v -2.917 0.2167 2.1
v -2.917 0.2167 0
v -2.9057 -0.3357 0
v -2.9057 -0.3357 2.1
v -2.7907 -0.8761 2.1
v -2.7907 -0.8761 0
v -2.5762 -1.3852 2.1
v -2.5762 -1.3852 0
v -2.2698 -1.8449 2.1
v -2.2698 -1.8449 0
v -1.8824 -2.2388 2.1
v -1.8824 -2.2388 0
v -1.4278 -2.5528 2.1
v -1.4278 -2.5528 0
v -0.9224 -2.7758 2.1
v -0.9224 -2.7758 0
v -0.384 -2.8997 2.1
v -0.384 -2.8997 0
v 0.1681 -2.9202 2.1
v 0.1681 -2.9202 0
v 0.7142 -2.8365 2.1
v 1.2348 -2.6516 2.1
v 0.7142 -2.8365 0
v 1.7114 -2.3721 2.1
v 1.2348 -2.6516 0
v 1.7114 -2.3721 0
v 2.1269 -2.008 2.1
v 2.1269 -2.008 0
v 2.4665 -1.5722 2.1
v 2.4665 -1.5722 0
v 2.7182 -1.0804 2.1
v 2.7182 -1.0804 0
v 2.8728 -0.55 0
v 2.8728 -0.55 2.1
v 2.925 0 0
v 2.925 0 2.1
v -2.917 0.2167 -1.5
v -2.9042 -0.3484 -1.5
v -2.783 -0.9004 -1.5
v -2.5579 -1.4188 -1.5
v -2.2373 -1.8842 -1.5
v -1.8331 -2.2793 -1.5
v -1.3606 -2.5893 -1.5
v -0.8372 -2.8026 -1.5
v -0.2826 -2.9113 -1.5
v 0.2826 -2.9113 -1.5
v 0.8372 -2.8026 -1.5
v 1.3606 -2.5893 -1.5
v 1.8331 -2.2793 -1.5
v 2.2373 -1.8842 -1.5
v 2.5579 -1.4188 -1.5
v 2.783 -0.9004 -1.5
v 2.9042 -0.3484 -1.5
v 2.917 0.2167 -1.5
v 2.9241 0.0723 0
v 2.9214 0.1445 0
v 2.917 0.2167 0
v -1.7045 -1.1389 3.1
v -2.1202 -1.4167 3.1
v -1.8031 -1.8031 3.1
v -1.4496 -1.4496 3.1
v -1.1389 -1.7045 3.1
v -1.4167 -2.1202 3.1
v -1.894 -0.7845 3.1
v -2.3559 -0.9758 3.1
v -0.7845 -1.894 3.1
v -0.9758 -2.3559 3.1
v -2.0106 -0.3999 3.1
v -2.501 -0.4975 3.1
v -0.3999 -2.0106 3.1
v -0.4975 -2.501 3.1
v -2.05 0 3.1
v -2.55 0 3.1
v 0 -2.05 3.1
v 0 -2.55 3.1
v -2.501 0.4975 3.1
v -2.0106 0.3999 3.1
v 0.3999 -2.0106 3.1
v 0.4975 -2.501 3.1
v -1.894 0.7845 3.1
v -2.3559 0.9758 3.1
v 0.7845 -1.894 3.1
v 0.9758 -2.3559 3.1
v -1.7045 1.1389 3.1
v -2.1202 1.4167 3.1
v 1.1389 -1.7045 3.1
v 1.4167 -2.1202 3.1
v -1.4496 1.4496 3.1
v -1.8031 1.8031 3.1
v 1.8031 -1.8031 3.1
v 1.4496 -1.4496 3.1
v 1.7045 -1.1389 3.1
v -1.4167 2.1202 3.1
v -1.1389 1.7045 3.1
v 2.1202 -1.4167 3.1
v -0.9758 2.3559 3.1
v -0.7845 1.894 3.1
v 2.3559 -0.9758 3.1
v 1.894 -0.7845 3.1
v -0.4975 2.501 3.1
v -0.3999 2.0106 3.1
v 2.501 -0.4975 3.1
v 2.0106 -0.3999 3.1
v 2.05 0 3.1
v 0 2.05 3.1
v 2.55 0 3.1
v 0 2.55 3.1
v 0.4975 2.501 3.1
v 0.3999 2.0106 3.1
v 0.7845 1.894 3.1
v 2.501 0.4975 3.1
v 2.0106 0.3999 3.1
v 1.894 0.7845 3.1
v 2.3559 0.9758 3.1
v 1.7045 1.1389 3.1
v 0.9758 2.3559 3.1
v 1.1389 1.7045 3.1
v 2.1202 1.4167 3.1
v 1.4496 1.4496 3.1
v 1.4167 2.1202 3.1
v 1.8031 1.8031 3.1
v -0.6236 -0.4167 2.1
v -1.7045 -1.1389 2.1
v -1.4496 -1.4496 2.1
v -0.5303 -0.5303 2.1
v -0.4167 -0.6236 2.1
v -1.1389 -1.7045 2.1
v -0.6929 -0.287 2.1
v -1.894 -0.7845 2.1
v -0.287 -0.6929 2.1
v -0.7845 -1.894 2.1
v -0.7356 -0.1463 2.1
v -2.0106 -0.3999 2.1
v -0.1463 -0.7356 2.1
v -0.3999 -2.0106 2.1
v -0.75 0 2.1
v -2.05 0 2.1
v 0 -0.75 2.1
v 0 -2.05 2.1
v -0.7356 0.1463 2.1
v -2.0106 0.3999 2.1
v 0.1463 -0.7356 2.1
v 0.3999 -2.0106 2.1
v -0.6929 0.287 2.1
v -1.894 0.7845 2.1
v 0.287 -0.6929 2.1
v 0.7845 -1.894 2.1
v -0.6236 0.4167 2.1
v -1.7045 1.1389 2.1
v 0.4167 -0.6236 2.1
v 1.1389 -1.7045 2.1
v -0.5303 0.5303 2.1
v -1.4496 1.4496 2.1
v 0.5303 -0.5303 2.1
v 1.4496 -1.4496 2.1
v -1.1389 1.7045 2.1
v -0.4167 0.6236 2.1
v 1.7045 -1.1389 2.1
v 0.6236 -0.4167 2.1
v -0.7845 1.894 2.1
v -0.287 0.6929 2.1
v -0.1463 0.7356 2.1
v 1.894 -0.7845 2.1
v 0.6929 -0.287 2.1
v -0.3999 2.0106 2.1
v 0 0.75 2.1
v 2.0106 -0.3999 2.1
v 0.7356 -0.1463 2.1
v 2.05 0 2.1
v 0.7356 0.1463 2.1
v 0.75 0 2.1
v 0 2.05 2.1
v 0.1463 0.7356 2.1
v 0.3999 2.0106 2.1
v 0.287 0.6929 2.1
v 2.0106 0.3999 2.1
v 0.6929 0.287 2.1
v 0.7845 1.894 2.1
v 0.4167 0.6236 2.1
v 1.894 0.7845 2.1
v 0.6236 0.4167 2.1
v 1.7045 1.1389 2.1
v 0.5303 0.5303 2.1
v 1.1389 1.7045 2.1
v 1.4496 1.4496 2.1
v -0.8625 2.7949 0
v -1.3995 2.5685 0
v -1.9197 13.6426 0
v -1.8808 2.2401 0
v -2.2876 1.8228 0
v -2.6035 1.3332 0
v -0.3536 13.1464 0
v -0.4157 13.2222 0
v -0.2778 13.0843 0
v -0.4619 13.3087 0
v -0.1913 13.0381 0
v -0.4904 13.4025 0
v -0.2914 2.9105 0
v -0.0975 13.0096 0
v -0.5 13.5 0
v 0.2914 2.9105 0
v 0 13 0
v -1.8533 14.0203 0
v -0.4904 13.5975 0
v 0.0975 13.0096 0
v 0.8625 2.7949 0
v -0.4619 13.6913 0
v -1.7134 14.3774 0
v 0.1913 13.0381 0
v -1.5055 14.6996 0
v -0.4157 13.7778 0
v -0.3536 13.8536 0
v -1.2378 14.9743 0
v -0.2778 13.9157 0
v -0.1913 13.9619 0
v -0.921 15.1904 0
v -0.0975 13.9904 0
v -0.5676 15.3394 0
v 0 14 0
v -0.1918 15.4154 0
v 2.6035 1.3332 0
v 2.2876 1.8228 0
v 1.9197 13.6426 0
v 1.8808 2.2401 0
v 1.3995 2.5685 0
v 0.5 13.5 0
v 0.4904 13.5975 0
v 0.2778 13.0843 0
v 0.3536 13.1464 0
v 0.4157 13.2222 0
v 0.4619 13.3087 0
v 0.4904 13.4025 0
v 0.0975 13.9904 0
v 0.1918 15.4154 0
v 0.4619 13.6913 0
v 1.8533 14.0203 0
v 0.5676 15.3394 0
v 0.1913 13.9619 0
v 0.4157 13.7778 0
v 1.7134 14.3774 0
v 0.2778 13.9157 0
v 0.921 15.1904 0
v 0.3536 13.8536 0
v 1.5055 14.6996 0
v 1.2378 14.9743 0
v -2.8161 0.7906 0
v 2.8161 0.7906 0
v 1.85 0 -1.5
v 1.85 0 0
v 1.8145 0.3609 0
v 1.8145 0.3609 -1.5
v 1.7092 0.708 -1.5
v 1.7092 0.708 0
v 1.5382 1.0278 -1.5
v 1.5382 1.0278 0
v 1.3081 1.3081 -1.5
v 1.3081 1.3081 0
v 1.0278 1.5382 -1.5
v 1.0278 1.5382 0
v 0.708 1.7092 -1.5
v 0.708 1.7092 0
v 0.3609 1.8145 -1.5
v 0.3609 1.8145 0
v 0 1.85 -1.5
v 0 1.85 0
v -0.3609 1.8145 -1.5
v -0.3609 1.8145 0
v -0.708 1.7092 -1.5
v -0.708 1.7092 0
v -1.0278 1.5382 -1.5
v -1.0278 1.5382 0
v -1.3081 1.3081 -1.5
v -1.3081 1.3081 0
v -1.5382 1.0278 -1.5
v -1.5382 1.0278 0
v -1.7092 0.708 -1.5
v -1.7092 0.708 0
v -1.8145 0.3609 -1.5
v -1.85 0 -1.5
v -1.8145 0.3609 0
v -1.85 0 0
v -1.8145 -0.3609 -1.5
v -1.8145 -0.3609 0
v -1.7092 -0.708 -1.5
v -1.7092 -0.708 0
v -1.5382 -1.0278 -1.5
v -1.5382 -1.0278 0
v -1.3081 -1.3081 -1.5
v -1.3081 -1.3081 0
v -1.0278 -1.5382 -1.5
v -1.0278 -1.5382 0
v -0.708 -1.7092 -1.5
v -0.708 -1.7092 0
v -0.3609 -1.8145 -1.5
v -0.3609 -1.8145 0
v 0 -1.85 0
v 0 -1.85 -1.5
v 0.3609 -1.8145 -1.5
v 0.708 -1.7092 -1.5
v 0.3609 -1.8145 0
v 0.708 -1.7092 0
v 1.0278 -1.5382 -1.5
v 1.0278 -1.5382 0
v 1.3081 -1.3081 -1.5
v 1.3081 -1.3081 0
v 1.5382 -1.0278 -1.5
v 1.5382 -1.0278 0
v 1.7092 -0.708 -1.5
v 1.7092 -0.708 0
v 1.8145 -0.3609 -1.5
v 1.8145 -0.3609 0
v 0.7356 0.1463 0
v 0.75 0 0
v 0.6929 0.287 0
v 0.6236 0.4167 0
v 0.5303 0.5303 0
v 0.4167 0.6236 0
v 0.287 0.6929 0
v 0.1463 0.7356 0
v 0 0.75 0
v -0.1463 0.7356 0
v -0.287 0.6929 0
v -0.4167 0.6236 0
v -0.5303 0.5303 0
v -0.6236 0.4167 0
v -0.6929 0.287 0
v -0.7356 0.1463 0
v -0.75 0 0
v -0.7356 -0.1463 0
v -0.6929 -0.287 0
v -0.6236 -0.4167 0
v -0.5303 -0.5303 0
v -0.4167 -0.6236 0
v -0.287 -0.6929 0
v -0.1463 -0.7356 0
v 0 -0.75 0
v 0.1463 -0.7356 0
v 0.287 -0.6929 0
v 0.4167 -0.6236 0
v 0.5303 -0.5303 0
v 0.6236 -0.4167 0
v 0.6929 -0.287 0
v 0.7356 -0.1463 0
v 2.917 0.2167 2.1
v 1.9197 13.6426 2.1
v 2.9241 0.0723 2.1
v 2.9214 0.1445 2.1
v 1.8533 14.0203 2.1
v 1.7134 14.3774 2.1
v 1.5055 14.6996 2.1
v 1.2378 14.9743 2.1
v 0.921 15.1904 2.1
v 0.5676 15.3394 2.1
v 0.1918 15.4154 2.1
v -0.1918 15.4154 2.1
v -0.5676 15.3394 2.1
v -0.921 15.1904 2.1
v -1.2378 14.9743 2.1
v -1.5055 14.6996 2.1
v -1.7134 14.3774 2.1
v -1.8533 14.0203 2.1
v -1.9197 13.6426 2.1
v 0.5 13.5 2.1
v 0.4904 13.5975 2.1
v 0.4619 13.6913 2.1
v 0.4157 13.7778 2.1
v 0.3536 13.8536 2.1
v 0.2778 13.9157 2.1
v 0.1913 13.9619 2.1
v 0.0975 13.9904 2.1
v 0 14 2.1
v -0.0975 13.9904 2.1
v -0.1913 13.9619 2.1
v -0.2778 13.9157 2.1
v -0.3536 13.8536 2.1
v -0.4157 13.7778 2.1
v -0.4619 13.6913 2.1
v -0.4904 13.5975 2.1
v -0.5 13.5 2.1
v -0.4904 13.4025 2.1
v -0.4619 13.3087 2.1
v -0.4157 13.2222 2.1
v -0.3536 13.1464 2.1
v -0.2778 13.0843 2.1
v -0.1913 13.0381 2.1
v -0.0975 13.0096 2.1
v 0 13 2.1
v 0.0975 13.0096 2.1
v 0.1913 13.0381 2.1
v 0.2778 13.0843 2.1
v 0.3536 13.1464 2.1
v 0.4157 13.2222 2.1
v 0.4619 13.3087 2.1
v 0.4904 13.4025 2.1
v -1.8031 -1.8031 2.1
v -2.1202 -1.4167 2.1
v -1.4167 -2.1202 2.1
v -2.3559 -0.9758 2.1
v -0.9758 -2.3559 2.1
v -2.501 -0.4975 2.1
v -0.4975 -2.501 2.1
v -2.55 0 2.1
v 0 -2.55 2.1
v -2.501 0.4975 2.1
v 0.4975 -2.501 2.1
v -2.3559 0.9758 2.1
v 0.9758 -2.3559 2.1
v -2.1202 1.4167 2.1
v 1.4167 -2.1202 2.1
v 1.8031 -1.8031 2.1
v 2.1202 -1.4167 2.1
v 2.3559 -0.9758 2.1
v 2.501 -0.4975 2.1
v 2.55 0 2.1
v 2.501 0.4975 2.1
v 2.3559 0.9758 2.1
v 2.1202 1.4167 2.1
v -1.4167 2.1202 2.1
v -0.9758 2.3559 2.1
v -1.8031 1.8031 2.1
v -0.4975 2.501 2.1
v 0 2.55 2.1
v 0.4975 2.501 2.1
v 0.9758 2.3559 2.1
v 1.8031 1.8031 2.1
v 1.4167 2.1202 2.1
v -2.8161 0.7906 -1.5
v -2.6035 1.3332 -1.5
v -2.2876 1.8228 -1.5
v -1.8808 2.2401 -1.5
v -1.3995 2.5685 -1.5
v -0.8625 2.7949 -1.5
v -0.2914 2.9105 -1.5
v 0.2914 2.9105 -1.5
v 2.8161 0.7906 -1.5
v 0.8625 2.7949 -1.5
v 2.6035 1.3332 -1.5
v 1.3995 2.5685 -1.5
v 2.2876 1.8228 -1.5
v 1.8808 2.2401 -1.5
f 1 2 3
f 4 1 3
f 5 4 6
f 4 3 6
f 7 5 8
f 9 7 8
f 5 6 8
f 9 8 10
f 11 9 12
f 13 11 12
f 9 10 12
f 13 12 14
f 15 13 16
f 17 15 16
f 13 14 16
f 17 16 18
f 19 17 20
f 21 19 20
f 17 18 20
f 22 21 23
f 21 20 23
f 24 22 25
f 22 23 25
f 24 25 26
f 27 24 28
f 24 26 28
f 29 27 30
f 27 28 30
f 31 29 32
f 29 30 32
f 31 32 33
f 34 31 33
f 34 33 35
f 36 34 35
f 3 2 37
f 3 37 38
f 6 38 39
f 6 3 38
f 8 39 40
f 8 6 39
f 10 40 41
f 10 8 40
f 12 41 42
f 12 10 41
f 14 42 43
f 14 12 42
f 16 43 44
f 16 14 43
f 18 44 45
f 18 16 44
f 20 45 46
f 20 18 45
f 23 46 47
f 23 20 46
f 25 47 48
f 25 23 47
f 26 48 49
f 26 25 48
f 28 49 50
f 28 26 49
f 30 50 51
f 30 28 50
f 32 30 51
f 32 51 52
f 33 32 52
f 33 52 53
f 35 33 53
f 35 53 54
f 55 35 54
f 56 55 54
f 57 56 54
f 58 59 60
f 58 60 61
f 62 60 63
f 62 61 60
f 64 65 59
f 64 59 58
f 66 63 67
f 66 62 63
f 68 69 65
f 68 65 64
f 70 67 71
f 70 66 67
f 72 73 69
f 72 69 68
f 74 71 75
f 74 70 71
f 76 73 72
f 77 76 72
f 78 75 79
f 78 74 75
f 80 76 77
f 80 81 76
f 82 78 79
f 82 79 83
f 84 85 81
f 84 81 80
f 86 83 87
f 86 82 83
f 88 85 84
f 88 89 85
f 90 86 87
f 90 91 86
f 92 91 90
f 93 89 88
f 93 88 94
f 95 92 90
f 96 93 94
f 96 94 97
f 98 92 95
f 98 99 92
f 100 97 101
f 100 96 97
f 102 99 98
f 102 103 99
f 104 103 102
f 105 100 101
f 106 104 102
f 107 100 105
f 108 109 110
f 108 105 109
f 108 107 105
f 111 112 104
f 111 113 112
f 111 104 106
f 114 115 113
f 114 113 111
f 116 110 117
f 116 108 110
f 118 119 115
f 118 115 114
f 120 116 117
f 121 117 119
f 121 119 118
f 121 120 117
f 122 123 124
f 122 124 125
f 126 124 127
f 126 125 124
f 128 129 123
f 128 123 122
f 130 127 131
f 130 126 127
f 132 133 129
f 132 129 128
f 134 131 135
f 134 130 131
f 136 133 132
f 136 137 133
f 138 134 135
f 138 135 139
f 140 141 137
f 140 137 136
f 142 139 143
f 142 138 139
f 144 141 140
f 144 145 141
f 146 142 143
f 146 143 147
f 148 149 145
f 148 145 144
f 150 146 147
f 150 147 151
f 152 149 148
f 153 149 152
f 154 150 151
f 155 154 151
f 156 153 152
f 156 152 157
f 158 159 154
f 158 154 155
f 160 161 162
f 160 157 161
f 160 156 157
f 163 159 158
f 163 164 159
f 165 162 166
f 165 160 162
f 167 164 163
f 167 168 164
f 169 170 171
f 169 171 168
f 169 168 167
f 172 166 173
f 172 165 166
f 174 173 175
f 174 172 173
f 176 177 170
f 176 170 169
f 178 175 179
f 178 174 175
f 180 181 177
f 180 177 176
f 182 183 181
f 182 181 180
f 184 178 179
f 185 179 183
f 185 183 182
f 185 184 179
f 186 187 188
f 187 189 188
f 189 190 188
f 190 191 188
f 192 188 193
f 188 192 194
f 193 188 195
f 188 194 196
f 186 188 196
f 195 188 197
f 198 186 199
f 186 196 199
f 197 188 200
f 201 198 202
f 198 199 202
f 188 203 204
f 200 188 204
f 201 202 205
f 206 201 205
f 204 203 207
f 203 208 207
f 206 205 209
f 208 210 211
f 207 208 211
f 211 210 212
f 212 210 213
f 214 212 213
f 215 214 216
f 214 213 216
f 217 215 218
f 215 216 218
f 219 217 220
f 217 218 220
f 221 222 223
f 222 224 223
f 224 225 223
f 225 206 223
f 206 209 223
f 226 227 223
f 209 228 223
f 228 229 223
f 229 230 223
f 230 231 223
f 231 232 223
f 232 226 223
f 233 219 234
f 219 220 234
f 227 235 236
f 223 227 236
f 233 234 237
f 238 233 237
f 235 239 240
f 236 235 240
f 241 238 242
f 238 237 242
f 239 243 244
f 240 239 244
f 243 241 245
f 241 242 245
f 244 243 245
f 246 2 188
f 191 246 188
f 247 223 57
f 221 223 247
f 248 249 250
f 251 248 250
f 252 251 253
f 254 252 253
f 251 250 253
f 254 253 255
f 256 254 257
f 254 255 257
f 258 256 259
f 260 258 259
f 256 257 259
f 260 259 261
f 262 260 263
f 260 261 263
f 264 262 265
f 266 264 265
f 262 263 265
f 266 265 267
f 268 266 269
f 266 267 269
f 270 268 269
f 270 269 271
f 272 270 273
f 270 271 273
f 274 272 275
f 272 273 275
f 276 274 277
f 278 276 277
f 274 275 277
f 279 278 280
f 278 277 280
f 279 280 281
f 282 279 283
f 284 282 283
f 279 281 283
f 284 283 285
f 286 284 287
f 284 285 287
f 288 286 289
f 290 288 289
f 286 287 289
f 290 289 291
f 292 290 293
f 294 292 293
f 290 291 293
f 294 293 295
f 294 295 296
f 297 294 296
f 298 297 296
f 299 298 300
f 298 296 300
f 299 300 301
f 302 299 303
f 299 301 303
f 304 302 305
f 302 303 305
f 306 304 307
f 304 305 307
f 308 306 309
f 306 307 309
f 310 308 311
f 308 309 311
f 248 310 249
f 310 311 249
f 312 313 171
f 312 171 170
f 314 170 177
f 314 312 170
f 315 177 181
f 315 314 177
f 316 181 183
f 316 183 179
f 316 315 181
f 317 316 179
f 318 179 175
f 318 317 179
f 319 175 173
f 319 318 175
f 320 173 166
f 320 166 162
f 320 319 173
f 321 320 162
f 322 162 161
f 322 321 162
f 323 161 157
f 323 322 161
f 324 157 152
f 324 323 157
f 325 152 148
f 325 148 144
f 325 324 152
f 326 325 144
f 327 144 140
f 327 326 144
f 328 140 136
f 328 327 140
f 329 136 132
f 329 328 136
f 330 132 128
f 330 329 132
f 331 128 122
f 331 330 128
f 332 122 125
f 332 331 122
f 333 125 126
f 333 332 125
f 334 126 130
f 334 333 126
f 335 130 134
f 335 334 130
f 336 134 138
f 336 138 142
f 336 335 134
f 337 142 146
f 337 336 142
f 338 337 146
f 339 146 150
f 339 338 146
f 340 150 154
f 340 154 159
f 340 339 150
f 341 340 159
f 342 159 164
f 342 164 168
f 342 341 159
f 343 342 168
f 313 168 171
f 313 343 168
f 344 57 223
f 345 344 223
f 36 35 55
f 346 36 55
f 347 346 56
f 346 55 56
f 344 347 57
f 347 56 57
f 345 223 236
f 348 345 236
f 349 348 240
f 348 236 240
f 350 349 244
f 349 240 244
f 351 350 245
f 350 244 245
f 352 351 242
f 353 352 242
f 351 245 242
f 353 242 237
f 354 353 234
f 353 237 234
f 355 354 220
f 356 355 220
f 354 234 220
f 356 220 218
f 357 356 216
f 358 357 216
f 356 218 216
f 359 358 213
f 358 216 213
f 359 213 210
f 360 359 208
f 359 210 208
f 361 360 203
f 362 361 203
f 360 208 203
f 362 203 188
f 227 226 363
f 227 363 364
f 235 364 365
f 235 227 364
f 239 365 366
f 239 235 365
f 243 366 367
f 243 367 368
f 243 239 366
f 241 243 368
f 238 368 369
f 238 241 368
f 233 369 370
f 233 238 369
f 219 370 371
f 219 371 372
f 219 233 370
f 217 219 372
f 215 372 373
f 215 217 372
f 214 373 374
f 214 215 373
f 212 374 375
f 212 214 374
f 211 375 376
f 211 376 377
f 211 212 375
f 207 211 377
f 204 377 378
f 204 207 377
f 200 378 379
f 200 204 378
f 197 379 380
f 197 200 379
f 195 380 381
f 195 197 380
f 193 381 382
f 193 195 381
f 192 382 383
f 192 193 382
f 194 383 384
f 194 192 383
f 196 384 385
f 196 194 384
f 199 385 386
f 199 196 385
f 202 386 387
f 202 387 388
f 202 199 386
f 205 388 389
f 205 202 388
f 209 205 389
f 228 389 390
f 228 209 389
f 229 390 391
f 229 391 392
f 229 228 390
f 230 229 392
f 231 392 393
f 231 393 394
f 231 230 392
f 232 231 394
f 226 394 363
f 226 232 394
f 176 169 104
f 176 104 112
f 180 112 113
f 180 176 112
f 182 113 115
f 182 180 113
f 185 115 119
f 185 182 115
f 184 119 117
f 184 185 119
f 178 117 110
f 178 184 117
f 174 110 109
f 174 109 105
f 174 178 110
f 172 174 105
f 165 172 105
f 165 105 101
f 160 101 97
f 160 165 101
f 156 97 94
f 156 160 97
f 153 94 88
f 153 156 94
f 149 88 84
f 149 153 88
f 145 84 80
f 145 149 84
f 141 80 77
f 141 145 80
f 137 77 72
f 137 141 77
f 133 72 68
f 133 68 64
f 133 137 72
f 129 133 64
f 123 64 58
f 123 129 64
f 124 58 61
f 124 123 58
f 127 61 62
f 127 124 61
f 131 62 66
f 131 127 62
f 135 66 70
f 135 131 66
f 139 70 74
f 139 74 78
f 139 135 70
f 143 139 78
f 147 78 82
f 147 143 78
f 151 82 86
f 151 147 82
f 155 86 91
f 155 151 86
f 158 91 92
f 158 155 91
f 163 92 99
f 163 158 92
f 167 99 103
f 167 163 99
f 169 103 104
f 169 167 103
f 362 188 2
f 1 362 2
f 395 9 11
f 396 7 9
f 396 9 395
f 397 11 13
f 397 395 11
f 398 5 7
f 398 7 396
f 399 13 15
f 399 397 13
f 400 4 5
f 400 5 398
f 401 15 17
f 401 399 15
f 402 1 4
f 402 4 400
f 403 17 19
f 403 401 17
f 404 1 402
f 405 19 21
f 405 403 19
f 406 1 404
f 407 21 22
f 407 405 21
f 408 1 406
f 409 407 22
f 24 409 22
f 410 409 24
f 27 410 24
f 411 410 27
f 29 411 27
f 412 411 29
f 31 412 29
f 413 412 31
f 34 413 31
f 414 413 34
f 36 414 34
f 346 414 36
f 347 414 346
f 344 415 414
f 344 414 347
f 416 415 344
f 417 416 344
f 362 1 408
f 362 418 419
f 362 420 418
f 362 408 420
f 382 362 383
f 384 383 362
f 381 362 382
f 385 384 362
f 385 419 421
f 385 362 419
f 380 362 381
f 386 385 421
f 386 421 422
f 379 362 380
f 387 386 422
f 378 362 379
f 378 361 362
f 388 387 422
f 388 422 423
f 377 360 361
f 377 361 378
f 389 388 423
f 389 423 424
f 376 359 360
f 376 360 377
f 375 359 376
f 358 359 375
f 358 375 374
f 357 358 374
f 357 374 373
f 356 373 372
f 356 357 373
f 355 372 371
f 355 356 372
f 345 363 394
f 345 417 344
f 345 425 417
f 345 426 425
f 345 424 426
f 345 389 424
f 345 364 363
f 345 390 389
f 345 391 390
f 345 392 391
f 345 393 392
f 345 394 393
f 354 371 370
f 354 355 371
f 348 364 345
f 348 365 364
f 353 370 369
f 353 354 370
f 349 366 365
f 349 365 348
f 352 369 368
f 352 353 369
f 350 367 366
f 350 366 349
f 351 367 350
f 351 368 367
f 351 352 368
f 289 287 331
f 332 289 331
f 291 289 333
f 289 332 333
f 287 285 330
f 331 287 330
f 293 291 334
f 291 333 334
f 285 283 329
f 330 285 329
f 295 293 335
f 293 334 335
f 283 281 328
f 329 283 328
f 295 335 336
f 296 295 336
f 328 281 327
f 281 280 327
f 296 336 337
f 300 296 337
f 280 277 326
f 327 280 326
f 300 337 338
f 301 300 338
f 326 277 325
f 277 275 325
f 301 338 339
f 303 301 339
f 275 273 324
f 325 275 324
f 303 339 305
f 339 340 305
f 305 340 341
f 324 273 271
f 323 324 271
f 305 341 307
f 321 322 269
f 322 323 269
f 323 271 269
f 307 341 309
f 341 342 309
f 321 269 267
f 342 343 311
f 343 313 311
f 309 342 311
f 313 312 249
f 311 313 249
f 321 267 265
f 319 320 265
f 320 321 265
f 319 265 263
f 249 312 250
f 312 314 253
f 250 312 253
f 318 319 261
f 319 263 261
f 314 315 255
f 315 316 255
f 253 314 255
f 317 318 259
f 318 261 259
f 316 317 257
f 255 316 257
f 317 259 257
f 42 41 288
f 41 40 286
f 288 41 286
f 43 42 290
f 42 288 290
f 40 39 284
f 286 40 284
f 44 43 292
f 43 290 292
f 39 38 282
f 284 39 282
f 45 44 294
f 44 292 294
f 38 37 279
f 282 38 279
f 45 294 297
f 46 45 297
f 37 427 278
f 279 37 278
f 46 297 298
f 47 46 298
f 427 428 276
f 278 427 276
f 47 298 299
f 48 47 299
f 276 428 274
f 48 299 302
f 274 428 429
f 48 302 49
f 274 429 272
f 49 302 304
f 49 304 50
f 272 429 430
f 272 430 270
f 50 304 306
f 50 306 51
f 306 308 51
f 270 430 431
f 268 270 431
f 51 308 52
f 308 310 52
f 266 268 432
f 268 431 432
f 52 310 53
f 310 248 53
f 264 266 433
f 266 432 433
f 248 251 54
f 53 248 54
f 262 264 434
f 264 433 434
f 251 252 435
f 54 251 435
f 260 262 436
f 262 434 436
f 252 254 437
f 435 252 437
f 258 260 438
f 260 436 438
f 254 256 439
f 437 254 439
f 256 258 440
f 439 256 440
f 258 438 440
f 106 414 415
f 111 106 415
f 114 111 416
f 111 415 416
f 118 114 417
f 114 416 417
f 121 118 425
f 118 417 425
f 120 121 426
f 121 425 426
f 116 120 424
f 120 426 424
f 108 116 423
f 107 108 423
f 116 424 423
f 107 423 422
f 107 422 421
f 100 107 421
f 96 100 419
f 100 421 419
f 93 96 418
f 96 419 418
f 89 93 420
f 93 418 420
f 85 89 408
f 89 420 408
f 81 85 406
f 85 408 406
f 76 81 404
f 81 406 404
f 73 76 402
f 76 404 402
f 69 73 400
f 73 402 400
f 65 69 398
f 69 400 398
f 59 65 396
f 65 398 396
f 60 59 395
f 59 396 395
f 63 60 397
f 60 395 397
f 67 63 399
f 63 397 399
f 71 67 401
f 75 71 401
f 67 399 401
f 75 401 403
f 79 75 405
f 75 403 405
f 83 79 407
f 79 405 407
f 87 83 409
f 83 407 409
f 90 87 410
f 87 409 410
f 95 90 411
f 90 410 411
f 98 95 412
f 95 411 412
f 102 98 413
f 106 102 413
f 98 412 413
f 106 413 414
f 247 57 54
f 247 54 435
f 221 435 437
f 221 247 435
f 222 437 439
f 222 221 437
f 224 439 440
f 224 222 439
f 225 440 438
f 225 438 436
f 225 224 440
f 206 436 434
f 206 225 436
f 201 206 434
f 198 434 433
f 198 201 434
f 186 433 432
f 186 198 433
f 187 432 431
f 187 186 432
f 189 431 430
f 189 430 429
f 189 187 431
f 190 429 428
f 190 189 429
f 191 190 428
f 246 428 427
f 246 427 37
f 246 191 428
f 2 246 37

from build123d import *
from build123d import SkipClean  # not in build123d's __all__

# Parameters (mm, degrees)
F0_R     = 0.75
F0_R_2   = 0.5
F1_DEPTH = 2.1
F2_R     = 1.85
F3_DEPTH = 1.5
F4_R     = 2.55
F4_R_2   = 2.05
F5_DEPTH = 1


# Not quite as in the source:
# - after a boolean that leaves OpenCascade's solid faulty, fix() repairs it


with BuildPart() as f1:
    # F0 (on Top) → F1 (new body)
    with BuildSketch(Plane.XY):
        with BuildLine():
            ThreePointArc((-2.9169642705, 0.2166666667), (-0.108407815, -2.9229903773), (2.925, 0))
            ThreePointArc((2.925, 0), (2.9229903773, 0.108407815), (2.9169642705, 0.2166666667))
            ThreePointArc((2.9169642705, 0.2166666667), (0, 2.925), (-2.9169642705, 0.2166666667))
        make_face()
        Circle(F0_R, mode=Mode.SUBTRACT)
        with BuildLine():
            ThreePointArc((-2.9169642705, 0.2166666667), (0, 2.925), (2.9169642705, 0.2166666667))
            Line((2.9169642705, 0.2166666667), (1.9197115285, 13.6425925926))
            ThreePointArc((1.9197115285, 13.6425925926), (1.9236774278, 13.5713453141), (1.925, 13.5))
            ThreePointArc((1.925, 13.5), (-0.0713453141, 11.5763225722), (-1.9197115285, 13.6425925926))
            Line((-1.9197115285, 13.6425925926), (-2.9169642705, 0.2166666667))
        make_face()
        with BuildLine():
            ThreePointArc((1.925, 13.5), (1.9236774278, 13.5713453141), (1.9197115285, 13.6425925926))
            ThreePointArc((1.9197115285, 13.6425925926), (0, 15.425), (-1.9197115285, 13.6425925926))
            ThreePointArc((-1.9197115285, 13.6425925926), (-0.0713453141, 11.5763225722), (1.925, 13.5))
        make_face()
        with Locations((0, 13.5)):
            Circle(F0_R_2, mode=Mode.SUBTRACT)
    extrude(amount=F1_DEPTH)

    # F2 (on face) → F3 (join)
    with BuildSketch(Plane.XY):
        with BuildLine():
            ThreePointArc((2.9169642705, 0.2166666667), (0, 2.925), (-2.9169642705, 0.2166666667))
            ThreePointArc((-2.9169642705, 0.2166666667), (0, -2.925), (2.9169642705, 0.2166666667))
        make_face()
        Circle(F2_R, mode=Mode.SUBTRACT)
    with SkipClean():  # cleaning this boolean's faces spoils the solid; the shape is the same uncleaned
        extrude(amount=-F3_DEPTH)

    # F4 (on face) → F5 (join)
    with BuildSketch(Plane.XY.offset(2.1)):
        Circle(F4_R)
        Circle(F4_R_2, mode=Mode.SUBTRACT)
    extrude(amount=F5_DEPTH)

    add(f1.part.fix(), mode=Mode.REPLACE)


solid = f1.part
